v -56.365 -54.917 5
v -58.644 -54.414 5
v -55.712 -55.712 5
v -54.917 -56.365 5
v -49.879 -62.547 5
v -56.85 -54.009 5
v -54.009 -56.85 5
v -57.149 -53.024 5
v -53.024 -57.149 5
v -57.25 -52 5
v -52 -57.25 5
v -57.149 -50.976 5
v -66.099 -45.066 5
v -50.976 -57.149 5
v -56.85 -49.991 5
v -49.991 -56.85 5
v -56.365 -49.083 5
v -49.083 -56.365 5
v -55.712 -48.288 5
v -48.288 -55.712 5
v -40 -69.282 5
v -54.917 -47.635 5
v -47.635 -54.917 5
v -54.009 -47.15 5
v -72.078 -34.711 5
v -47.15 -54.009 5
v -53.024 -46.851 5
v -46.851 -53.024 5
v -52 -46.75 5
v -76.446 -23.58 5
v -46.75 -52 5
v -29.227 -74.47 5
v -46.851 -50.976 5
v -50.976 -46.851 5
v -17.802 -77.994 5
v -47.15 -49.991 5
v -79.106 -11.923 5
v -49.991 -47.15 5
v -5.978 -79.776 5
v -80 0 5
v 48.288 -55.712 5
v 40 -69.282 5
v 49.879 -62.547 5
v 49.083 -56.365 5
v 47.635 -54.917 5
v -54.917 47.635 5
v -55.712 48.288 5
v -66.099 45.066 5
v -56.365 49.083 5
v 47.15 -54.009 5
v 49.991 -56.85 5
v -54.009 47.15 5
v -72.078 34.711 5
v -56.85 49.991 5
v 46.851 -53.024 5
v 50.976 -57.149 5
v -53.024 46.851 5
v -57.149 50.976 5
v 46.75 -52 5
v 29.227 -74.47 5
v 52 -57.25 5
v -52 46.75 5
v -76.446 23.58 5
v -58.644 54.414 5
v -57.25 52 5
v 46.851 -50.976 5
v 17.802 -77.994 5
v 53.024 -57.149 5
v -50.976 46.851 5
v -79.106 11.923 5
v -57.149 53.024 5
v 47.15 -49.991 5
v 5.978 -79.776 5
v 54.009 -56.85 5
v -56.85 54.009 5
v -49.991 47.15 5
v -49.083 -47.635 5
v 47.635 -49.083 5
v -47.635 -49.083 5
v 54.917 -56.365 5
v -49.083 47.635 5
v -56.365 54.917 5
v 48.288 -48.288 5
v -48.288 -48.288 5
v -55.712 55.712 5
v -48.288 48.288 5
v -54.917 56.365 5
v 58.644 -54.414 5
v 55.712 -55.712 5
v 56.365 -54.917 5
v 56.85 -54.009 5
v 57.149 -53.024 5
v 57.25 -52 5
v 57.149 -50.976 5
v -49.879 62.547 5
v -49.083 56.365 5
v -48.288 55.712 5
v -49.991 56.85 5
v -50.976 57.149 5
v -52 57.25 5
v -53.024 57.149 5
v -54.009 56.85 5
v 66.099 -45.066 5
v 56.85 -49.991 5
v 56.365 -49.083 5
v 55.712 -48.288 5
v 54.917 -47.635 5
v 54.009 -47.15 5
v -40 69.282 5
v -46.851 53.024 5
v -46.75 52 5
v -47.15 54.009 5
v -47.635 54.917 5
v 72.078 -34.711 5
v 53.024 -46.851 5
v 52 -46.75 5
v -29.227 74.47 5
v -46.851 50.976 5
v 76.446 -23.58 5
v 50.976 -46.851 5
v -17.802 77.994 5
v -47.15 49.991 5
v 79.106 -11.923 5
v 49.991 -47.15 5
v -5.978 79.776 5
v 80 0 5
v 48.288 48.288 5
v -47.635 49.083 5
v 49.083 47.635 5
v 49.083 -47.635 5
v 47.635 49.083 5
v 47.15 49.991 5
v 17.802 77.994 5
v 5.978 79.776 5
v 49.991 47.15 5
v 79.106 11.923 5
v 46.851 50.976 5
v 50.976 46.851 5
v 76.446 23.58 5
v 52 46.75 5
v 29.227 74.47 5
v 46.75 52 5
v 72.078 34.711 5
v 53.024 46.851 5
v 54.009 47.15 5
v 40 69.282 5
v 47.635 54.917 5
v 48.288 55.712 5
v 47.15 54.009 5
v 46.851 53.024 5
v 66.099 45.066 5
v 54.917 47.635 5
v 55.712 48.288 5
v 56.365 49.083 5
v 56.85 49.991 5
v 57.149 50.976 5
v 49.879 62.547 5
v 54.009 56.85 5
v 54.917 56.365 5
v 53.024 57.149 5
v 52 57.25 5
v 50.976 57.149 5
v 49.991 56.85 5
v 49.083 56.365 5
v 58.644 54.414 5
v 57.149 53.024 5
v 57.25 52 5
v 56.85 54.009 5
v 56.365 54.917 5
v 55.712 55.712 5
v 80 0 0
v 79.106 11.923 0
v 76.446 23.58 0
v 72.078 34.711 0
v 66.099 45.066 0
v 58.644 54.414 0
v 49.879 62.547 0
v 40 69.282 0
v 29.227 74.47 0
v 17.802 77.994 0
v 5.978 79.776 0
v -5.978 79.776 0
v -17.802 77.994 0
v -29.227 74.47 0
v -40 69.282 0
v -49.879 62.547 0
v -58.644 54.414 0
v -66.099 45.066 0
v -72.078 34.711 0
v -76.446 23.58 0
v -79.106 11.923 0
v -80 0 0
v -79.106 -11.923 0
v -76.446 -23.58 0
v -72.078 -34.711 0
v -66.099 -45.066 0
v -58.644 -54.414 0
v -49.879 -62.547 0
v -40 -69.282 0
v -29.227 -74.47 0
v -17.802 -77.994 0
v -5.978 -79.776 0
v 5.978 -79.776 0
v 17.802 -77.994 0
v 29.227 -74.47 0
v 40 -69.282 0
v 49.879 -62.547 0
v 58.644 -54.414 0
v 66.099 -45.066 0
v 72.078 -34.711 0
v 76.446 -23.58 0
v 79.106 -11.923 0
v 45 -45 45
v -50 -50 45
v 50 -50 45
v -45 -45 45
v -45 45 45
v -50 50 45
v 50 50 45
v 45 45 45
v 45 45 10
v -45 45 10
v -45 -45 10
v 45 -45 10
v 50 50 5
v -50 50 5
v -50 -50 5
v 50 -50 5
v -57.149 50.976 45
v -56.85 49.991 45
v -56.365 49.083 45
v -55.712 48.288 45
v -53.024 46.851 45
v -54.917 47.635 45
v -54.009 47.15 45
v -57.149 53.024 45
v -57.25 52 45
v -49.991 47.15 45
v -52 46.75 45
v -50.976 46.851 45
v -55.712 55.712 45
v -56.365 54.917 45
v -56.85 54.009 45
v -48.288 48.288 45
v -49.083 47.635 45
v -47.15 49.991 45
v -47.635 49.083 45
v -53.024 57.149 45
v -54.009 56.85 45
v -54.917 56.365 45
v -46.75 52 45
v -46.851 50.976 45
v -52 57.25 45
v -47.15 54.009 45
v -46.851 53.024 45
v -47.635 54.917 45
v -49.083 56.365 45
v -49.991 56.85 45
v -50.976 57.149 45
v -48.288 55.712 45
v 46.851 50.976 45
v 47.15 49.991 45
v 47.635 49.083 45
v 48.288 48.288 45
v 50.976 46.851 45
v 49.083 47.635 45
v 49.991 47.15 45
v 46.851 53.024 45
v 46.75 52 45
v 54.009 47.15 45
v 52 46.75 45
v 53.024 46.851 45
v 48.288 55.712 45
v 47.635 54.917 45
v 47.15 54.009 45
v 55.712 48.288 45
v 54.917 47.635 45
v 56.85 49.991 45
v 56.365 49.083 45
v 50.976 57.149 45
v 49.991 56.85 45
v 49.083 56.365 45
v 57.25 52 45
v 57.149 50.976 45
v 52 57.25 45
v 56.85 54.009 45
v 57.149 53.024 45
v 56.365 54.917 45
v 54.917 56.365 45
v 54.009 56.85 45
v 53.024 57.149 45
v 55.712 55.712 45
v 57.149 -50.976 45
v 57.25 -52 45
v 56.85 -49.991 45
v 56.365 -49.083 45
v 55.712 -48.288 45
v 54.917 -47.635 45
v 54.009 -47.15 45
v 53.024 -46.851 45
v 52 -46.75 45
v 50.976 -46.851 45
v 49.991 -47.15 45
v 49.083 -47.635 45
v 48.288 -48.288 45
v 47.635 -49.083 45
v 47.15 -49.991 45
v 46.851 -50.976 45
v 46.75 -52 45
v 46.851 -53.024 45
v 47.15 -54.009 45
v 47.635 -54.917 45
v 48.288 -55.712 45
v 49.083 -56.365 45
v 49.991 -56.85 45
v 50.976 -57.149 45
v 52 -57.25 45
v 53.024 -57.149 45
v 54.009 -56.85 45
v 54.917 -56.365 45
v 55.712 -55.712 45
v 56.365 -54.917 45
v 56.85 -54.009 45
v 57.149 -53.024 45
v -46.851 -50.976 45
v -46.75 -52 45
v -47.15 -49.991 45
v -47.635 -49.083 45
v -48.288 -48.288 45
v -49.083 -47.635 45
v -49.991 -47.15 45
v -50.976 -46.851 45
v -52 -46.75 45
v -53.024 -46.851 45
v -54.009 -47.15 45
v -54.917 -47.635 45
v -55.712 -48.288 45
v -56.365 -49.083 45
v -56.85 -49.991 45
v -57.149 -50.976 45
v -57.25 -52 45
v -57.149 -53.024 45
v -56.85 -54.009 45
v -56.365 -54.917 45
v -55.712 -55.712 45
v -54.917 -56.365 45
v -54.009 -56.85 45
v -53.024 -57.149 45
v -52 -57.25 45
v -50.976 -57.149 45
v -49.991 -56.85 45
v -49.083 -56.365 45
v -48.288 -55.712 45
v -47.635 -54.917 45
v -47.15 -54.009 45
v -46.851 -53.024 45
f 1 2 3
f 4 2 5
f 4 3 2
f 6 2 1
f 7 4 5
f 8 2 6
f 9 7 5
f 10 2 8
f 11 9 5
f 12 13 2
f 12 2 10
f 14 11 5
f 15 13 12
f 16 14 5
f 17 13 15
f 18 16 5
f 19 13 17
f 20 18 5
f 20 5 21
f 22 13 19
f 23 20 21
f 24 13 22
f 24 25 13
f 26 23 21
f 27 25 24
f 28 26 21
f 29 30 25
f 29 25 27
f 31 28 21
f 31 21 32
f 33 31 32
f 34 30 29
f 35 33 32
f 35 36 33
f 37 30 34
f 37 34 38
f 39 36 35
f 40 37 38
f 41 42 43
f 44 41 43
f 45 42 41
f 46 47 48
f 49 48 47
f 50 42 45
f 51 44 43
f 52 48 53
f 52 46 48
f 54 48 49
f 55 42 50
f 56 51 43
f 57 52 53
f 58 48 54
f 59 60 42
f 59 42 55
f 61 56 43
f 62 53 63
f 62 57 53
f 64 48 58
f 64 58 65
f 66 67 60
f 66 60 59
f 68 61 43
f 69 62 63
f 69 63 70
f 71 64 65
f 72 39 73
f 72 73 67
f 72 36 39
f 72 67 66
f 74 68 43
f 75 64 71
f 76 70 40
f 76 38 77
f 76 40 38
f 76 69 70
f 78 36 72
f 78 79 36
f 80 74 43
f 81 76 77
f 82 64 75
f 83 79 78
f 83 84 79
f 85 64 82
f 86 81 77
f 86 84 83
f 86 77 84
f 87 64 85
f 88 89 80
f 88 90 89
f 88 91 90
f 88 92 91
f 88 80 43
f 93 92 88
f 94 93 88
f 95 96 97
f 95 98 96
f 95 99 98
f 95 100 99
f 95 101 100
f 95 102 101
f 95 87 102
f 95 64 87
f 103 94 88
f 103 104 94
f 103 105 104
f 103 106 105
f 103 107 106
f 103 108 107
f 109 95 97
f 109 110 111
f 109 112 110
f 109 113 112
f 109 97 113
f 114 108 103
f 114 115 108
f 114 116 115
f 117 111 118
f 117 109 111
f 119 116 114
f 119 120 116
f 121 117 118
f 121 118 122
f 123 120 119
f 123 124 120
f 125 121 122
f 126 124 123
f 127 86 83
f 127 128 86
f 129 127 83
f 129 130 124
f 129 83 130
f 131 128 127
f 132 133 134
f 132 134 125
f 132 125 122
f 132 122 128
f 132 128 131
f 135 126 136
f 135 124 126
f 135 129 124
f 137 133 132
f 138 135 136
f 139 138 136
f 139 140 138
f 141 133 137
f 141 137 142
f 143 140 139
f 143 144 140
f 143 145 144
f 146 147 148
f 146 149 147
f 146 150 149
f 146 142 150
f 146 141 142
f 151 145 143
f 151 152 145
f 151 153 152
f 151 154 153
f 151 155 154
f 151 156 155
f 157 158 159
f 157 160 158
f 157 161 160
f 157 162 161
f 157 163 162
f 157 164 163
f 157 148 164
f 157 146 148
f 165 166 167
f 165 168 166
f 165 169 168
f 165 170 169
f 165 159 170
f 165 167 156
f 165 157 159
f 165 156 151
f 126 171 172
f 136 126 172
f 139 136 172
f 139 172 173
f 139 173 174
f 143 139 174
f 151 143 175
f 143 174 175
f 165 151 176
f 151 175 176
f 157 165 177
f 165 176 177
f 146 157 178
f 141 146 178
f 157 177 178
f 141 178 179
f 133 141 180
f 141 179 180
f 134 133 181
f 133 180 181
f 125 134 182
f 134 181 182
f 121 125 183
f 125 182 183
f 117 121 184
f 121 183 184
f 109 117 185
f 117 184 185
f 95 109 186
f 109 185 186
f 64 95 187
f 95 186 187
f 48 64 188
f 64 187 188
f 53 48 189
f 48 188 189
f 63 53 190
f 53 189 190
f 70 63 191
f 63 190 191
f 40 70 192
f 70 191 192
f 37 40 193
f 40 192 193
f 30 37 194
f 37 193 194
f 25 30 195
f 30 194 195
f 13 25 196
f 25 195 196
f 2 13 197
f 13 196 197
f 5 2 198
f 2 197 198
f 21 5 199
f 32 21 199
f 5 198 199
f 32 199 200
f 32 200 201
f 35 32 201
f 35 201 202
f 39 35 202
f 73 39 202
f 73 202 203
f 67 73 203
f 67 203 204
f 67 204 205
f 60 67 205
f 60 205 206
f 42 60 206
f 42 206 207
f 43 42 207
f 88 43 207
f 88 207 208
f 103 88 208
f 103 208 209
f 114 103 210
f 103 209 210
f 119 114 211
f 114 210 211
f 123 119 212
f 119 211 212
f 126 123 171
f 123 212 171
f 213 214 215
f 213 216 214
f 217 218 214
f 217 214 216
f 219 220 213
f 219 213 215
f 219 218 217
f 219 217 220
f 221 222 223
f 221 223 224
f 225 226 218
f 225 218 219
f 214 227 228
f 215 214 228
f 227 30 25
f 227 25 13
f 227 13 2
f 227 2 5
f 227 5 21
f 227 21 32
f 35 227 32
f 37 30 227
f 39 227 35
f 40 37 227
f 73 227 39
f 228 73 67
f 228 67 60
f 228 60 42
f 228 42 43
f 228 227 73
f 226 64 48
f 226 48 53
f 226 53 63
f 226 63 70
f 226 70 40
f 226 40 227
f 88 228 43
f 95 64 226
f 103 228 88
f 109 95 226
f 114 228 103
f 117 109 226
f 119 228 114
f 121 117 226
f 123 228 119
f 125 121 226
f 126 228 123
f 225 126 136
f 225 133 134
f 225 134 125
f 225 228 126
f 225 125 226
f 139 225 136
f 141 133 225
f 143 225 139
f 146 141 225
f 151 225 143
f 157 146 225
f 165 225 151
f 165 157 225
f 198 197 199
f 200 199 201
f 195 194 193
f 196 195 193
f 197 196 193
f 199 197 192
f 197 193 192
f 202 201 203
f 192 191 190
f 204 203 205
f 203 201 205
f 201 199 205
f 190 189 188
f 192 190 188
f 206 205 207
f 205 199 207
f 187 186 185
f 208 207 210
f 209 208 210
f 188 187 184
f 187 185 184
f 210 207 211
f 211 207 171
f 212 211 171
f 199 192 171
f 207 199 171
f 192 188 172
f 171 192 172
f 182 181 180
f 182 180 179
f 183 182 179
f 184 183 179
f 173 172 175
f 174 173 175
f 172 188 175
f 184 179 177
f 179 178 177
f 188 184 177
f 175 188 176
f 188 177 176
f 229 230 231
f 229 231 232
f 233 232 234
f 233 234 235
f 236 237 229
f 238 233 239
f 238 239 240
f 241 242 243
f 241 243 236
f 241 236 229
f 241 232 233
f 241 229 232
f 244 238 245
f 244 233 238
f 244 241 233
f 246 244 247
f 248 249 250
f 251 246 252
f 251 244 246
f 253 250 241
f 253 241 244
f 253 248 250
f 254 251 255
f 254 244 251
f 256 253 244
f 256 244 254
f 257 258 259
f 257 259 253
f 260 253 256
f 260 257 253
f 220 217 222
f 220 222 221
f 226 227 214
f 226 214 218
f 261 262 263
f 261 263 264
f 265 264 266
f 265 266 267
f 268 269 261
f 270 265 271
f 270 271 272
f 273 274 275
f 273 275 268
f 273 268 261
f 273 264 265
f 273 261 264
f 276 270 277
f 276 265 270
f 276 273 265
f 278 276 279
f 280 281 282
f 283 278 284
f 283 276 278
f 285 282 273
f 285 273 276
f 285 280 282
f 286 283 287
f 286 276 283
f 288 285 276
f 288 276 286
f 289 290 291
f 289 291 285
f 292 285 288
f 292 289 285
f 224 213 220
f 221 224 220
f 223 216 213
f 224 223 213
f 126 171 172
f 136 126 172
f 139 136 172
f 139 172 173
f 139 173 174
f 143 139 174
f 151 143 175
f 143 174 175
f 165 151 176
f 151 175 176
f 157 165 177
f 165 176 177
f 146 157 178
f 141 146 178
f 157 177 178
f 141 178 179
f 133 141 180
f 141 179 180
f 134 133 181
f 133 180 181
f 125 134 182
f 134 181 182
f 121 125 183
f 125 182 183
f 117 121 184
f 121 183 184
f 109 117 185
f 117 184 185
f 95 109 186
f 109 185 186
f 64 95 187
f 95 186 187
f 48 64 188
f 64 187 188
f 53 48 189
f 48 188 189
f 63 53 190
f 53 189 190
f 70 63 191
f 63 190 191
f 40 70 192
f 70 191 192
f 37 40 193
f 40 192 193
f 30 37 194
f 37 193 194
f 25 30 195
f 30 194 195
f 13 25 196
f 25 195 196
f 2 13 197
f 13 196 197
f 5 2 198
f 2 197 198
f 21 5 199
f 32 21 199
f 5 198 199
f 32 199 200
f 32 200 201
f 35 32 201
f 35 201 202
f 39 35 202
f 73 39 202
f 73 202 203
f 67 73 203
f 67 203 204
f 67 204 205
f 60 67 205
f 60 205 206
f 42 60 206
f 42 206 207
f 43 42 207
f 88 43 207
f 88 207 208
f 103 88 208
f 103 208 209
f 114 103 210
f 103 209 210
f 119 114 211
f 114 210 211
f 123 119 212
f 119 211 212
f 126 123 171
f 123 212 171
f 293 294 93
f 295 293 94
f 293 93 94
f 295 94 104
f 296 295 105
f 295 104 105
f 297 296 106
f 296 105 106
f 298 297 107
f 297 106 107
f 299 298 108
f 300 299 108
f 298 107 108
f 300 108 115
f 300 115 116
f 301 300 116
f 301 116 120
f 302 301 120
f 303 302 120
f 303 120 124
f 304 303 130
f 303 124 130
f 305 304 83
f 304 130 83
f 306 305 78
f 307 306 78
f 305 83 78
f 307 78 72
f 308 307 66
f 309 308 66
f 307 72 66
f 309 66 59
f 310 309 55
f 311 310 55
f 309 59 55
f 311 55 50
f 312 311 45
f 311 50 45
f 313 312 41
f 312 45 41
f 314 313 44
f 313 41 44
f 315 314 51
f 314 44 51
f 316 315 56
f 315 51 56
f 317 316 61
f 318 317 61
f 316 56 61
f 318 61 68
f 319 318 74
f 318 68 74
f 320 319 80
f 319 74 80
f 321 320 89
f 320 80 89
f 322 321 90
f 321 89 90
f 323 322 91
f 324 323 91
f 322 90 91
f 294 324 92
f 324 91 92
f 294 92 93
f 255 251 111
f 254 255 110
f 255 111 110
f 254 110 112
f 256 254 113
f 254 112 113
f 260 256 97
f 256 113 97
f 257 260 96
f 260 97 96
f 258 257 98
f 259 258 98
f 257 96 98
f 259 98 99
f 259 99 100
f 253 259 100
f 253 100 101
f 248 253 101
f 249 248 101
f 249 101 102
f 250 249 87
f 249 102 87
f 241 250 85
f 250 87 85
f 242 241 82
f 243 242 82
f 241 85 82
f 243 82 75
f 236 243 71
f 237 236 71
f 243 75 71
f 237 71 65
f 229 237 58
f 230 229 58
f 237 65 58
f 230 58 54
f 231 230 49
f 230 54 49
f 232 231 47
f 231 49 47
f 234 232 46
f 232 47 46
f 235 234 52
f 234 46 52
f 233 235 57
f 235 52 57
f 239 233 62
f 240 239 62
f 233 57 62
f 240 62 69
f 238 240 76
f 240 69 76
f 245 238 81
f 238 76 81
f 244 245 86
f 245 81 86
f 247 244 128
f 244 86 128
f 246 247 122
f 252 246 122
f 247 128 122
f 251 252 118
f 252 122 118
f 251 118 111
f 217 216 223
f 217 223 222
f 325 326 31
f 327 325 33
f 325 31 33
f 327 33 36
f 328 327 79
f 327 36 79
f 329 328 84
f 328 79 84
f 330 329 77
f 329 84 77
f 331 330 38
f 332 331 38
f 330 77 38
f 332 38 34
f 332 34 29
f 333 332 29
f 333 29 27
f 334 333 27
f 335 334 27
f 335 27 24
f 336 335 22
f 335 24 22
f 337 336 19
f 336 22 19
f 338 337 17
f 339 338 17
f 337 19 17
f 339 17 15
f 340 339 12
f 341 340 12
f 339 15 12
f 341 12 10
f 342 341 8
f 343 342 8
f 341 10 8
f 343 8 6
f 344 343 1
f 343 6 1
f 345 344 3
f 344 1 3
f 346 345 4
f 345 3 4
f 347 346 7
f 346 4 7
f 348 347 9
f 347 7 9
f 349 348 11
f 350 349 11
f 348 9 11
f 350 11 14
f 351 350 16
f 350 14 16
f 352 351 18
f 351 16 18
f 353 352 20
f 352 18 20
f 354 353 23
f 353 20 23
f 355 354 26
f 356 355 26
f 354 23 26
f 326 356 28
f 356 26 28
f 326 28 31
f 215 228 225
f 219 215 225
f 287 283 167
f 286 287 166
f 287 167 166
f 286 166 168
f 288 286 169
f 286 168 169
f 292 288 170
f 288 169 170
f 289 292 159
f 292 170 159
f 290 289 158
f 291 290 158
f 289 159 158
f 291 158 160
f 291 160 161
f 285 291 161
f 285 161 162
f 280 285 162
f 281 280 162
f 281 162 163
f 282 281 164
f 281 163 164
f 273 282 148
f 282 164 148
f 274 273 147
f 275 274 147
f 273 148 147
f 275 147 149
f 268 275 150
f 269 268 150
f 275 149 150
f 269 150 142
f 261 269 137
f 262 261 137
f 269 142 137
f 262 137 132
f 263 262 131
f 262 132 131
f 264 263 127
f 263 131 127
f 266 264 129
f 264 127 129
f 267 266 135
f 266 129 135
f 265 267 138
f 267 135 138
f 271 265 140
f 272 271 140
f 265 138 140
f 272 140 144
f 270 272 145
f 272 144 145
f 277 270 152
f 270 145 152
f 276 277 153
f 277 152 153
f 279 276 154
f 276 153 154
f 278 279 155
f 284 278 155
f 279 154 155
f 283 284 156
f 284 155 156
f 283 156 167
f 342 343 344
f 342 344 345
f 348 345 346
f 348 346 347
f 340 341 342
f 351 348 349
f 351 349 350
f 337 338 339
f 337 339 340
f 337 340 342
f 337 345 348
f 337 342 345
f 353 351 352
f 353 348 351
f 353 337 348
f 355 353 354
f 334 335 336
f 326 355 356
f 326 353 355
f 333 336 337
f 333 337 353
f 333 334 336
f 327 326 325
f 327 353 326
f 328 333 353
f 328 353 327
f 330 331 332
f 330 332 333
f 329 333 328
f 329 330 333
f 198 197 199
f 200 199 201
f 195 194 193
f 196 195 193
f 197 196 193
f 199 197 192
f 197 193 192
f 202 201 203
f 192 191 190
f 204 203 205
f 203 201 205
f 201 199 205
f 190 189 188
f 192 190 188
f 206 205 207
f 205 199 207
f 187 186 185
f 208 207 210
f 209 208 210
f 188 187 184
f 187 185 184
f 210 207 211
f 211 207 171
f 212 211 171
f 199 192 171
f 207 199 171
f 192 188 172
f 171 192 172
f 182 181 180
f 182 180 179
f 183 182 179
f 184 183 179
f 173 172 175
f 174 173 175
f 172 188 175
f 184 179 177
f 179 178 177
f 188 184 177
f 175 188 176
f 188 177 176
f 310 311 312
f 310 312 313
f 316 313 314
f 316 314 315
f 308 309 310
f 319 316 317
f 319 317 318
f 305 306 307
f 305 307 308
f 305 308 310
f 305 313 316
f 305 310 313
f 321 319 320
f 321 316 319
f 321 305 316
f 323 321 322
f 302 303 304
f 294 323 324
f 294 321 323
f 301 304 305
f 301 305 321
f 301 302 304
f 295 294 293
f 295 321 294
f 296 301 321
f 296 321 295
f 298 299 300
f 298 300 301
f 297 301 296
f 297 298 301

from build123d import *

# Parameters (mm, degrees)
SKETCH_R     = 80
PAD_DEPTH    = 5
SKETCH002_R  = 5.25
PAD002_DEPTH = 40
SKETCH001_W  = 100
SKETCH001_H  = 100
PAD001_DEPTH = 40
SKETCH003_W  = 90
SKETCH003_H  = 90
POCKET_DEPTH = 35


with BuildPart() as pad:
    # Sketch → Pad (new body)
    with BuildSketch(Plane.XY):
        Circle(SKETCH_R)
    extrude(amount=PAD_DEPTH)


with BuildPart() as pad002:
    # Pad002 base: copy of Pad
    add(pad.part)

    # Sketch002 → Pad002 (new body)
    with BuildSketch(Plane.XY.offset(5)):
        with Locations((-52, 52)):
            Circle(SKETCH002_R)
        with Locations((-52, -52)):
            Circle(SKETCH002_R)
        with Locations((52, 52)):
            Circle(SKETCH002_R)
        with Locations((52, -52)):
            Circle(SKETCH002_R)
    extrude(amount=PAD002_DEPTH)


with BuildPart() as pocket:
    # Pad001 base: copy of Pad
    add(pad.part)

    # Sketch001 → Pad001 (new body)
    with BuildSketch(Plane.XY.offset(5)):
        Rectangle(SKETCH001_W, SKETCH001_H)
    extrude(amount=PAD001_DEPTH)

    # Sketch003 → Pocket (cut)
    with BuildSketch(Plane.XY.offset(45)):
        Rectangle(SKETCH003_W, SKETCH003_H)
    extrude(amount=-POCKET_DEPTH, mode=Mode.SUBTRACT)


solid = Compound([pad002.part, pocket.part])
